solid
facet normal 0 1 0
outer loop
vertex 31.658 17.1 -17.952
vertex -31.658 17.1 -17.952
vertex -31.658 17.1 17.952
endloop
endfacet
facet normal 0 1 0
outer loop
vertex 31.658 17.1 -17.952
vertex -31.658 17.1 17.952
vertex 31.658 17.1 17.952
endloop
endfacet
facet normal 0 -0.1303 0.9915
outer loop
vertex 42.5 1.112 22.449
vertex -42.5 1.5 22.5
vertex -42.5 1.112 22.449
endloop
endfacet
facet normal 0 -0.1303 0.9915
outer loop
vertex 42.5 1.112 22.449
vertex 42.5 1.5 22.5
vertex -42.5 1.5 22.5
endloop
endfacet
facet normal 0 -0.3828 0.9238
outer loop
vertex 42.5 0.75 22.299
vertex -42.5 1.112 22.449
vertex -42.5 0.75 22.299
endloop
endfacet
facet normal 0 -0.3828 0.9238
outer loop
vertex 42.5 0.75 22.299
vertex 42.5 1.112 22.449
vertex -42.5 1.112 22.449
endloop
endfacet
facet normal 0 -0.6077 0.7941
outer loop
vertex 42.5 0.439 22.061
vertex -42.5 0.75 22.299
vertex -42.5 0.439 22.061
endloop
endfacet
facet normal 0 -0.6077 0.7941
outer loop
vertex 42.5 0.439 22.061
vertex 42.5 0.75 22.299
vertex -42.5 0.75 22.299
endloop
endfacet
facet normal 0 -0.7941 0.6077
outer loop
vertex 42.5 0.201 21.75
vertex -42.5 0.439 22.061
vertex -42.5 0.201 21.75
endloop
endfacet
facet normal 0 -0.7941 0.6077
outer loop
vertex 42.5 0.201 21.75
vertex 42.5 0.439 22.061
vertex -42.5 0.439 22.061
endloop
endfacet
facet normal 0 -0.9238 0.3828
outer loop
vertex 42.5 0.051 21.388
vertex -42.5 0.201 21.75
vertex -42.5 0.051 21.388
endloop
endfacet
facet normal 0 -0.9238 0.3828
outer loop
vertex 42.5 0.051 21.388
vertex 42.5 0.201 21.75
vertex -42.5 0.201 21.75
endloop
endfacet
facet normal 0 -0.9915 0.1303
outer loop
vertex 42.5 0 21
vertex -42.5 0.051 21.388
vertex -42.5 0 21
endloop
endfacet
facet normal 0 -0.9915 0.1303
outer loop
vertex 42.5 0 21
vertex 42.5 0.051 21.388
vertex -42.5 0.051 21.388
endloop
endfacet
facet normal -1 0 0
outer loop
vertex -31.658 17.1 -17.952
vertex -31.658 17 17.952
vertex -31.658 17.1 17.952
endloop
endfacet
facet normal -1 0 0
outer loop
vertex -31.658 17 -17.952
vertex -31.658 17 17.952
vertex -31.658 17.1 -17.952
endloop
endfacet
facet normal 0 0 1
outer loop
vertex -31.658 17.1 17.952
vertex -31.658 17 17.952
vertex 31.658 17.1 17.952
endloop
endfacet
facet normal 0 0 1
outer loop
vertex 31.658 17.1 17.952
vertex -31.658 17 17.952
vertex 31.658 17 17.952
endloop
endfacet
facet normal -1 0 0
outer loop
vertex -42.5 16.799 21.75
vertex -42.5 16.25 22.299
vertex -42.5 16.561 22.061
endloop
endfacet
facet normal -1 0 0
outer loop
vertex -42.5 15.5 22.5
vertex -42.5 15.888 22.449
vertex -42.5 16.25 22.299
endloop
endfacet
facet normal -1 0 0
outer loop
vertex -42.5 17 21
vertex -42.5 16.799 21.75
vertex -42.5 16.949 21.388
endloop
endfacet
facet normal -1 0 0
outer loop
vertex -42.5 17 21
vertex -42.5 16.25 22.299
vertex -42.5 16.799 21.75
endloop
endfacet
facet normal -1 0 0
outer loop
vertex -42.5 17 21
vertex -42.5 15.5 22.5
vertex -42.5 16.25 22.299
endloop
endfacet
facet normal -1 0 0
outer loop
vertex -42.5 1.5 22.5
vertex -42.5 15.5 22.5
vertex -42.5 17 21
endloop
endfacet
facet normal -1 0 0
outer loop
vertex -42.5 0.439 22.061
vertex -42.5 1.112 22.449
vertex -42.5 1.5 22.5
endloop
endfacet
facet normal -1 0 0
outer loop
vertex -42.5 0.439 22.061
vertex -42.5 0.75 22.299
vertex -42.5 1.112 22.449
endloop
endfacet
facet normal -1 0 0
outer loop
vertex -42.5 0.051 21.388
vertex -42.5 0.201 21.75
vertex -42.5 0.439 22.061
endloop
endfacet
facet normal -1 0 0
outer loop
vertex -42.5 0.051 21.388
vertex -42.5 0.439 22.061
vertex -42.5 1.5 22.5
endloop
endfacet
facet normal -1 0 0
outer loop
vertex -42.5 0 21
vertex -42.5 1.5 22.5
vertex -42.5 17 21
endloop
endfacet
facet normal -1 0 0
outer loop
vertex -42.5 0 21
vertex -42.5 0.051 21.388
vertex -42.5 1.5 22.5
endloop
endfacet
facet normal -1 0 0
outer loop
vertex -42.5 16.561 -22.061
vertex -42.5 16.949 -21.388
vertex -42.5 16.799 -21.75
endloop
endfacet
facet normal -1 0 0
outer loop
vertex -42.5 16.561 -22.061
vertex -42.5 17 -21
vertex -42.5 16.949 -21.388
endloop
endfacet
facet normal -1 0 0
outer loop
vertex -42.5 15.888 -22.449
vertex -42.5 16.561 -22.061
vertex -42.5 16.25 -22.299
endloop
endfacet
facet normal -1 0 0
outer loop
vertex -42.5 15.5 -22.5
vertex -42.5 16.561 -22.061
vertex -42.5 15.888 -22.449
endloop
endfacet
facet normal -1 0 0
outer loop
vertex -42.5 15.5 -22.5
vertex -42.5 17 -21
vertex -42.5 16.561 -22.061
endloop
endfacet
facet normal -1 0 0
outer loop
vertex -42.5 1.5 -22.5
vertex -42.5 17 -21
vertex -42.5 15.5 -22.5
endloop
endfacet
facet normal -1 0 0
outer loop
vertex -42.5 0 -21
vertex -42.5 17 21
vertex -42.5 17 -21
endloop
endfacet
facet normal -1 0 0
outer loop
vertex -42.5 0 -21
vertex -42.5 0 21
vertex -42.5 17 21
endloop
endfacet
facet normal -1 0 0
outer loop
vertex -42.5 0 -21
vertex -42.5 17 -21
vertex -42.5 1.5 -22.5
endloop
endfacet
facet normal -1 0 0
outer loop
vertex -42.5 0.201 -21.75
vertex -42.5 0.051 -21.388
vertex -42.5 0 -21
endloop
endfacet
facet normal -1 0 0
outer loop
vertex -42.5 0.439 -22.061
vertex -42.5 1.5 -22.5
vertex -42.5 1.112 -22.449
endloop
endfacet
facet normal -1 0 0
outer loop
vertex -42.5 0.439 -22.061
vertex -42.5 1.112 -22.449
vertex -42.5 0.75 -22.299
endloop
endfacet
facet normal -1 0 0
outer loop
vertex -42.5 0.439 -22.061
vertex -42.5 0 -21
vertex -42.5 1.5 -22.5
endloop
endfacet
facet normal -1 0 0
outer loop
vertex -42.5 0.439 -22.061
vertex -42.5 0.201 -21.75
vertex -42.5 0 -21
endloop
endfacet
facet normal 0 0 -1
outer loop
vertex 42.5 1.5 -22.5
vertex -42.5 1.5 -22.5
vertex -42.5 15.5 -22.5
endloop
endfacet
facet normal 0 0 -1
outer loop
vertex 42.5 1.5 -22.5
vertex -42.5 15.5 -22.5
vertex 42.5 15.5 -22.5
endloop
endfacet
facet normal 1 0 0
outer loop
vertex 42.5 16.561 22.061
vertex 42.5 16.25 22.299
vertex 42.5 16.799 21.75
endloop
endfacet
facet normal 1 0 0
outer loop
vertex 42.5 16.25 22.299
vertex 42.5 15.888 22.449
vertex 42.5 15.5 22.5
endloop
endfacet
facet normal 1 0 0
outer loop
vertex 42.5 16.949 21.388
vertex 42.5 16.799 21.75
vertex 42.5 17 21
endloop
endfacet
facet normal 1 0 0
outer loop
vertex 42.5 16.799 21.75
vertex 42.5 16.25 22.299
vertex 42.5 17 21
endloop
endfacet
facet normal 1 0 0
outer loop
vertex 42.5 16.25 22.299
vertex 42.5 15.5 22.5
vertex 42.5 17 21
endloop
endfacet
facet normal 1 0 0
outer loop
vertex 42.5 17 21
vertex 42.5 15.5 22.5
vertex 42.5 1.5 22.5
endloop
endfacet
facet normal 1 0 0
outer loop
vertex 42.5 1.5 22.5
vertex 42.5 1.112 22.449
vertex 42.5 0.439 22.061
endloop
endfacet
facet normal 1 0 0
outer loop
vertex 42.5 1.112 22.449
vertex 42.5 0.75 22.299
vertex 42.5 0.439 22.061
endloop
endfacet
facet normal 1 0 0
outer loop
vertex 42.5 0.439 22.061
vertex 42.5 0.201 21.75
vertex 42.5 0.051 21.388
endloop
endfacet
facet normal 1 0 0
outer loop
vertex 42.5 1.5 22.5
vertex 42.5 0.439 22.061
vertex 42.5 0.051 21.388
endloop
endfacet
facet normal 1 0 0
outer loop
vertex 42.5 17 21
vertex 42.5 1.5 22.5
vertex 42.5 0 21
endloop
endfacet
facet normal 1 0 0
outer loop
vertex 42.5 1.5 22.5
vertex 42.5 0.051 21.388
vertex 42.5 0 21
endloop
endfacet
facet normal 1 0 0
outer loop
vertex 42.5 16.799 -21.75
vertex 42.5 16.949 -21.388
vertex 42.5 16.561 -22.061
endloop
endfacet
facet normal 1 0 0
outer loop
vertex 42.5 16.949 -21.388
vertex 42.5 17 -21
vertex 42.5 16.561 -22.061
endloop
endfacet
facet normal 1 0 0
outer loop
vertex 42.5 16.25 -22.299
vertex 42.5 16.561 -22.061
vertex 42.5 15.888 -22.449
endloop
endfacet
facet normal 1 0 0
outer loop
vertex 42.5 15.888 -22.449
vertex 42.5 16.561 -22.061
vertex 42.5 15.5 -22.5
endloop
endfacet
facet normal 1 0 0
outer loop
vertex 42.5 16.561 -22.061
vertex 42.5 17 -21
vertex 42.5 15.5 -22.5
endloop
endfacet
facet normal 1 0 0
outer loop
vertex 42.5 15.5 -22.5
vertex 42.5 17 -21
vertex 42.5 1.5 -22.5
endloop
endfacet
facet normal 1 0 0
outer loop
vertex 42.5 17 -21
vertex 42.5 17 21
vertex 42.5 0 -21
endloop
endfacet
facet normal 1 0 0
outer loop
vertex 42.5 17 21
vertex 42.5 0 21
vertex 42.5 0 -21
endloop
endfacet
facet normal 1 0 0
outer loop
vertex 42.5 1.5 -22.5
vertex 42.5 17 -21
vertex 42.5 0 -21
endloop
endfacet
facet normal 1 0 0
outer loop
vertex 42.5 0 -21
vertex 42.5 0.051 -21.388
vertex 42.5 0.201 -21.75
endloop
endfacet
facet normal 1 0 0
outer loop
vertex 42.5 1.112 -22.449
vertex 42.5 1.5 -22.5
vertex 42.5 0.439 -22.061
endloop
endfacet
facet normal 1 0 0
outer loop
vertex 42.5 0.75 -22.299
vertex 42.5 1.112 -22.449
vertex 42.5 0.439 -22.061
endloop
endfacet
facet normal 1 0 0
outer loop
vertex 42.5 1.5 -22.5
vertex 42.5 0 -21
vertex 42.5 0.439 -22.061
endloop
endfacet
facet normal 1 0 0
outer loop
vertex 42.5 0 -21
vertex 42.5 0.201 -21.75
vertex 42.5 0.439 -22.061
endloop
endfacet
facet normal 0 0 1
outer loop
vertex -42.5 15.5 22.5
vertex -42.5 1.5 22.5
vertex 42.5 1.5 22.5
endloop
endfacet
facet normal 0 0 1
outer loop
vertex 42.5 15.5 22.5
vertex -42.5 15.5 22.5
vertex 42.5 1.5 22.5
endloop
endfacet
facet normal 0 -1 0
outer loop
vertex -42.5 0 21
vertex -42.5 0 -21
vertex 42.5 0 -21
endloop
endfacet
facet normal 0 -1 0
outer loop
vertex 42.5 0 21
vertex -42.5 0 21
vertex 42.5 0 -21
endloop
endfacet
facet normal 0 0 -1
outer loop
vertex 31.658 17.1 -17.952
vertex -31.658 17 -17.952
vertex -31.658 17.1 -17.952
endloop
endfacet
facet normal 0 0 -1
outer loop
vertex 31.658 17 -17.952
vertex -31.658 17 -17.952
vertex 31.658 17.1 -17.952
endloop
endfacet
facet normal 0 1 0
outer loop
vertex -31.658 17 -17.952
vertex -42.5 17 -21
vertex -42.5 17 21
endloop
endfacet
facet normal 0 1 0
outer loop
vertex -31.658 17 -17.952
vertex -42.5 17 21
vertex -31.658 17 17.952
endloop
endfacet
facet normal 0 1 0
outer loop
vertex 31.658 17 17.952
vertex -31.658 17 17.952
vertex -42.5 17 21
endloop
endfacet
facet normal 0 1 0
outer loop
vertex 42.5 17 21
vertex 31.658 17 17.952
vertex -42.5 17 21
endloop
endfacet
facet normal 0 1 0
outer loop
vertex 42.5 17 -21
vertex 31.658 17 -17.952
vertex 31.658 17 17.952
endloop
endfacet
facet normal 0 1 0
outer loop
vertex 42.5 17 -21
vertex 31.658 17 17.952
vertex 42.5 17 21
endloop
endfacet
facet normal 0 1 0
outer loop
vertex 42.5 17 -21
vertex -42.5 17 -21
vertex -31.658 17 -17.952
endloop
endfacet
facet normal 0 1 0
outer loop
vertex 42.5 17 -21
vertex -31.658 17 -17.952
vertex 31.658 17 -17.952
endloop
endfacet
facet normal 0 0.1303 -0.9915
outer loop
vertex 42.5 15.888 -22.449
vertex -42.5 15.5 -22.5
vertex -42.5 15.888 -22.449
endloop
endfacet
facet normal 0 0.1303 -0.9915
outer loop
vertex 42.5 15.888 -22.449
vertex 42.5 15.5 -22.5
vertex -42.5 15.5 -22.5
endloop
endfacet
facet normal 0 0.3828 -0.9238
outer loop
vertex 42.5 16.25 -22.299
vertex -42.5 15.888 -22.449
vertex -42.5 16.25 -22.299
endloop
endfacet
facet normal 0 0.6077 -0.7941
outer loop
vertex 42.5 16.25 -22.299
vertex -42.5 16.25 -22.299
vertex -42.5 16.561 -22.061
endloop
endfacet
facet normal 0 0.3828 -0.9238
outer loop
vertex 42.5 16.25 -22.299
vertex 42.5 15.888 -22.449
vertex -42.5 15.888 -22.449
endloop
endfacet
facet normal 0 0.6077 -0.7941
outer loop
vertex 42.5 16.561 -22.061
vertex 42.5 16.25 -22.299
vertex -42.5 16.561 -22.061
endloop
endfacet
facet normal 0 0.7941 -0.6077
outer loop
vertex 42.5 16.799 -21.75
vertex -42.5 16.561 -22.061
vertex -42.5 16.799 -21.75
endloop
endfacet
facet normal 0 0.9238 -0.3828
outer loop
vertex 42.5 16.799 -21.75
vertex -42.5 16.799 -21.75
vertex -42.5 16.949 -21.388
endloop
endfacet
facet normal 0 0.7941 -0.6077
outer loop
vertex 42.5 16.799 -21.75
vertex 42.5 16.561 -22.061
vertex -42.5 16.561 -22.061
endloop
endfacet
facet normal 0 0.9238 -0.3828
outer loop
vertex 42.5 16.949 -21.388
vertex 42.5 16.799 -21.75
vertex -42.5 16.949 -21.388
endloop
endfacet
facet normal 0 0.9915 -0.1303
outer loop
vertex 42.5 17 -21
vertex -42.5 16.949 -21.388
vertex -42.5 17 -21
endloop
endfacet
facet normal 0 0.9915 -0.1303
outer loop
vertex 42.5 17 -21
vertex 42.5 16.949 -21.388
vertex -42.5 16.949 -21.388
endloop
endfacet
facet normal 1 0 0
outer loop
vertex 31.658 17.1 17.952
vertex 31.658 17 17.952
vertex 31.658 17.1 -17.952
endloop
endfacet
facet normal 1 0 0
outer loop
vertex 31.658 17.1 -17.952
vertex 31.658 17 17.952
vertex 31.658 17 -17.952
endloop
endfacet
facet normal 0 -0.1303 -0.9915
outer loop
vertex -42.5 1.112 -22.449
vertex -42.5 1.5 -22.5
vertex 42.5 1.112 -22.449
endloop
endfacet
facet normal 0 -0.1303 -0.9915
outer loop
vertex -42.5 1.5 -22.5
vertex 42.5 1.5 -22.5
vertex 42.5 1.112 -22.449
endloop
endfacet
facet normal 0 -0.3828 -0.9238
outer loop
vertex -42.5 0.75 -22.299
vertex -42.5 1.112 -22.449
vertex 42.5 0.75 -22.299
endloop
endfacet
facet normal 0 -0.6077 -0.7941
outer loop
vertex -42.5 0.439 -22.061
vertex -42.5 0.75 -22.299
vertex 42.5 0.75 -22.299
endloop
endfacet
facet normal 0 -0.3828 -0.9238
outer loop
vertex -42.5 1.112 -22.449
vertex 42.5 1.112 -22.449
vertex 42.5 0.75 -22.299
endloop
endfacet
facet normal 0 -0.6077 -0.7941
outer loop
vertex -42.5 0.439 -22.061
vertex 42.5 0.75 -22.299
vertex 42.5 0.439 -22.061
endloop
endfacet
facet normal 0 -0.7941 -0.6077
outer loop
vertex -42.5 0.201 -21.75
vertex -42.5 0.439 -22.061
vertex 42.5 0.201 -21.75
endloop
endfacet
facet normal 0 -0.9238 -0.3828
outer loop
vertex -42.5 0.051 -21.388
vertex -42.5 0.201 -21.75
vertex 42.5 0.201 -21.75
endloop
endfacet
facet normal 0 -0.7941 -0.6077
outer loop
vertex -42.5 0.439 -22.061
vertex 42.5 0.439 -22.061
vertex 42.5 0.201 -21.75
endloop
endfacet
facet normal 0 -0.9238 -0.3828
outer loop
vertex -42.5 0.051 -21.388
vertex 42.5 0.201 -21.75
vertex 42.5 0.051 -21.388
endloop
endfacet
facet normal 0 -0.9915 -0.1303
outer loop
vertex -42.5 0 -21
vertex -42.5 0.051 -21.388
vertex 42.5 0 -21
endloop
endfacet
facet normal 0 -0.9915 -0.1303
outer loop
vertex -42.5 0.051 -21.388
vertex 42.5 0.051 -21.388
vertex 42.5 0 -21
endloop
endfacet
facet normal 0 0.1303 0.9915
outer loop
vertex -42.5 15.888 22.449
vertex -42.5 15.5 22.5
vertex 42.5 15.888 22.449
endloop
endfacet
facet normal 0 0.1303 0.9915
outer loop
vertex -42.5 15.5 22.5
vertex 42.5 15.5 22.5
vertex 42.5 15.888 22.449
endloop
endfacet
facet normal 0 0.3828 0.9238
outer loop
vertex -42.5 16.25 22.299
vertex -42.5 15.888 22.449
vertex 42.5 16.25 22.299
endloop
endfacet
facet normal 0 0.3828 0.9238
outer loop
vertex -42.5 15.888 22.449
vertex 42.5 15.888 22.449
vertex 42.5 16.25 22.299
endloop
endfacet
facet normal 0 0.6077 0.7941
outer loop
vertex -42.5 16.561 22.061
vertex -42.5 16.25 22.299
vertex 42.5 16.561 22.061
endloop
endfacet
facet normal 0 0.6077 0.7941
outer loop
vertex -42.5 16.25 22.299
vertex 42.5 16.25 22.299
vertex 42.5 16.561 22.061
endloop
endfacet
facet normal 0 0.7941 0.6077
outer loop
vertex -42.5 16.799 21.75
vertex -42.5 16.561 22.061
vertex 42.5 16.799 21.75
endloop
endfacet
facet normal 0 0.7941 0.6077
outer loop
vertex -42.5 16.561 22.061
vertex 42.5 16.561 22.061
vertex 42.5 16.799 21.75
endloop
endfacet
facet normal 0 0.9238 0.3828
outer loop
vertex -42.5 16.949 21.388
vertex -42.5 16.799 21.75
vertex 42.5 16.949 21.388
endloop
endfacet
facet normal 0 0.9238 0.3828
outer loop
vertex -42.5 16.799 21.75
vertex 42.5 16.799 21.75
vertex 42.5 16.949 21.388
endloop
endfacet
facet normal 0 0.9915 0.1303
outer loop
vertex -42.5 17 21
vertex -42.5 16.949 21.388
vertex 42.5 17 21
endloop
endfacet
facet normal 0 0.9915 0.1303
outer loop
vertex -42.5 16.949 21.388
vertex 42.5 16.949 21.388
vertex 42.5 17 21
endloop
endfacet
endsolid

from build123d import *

# Parameters (mm, degrees)
ESBO_O1_W                = 85
ESBO_O1_H                = 45
RESSALTO_EXTRUS_O1_DEPTH = 17
FILETE1_R                = 1.5
ESBO_O2_W                = 63.315602634
ESBO_O2_H                = 35.904579542
RESSALTO_EXTRUS_O2_DEPTH = 0.1


with BuildPart() as part:
    # Esboço1 → Ressalto-extrusão1 (new body)
    with BuildSketch(Plane(origin=(0, 0, 0), x_dir=(1, 0, 0), z_dir=(0, 1, 0))):
        Rectangle(ESBO_O1_W, ESBO_O1_H)
    extrude(amount=RESSALTO_EXTRUS_O1_DEPTH)

    # Filete1
    filete1_edges = [part.edges().sort_by_distance(p)[0] for p in [
        (0, 17, 22.5),
        (0, 0, 22.5),
        (0, 0, -22.5),
        (0, 17, -22.5),
    ]]
    fillet(filete1_edges, radius=FILETE1_R)

    # Esboço2 → Ressalto-extrusão2 (add)
    with BuildSketch(Plane(origin=(0, 17, 0), x_dir=(1, 0, 0), z_dir=(0, 1, 0))):
        Rectangle(ESBO_O2_W, ESBO_O2_H)
    extrude(amount=RESSALTO_EXTRUS_O2_DEPTH)


solid = part.part
